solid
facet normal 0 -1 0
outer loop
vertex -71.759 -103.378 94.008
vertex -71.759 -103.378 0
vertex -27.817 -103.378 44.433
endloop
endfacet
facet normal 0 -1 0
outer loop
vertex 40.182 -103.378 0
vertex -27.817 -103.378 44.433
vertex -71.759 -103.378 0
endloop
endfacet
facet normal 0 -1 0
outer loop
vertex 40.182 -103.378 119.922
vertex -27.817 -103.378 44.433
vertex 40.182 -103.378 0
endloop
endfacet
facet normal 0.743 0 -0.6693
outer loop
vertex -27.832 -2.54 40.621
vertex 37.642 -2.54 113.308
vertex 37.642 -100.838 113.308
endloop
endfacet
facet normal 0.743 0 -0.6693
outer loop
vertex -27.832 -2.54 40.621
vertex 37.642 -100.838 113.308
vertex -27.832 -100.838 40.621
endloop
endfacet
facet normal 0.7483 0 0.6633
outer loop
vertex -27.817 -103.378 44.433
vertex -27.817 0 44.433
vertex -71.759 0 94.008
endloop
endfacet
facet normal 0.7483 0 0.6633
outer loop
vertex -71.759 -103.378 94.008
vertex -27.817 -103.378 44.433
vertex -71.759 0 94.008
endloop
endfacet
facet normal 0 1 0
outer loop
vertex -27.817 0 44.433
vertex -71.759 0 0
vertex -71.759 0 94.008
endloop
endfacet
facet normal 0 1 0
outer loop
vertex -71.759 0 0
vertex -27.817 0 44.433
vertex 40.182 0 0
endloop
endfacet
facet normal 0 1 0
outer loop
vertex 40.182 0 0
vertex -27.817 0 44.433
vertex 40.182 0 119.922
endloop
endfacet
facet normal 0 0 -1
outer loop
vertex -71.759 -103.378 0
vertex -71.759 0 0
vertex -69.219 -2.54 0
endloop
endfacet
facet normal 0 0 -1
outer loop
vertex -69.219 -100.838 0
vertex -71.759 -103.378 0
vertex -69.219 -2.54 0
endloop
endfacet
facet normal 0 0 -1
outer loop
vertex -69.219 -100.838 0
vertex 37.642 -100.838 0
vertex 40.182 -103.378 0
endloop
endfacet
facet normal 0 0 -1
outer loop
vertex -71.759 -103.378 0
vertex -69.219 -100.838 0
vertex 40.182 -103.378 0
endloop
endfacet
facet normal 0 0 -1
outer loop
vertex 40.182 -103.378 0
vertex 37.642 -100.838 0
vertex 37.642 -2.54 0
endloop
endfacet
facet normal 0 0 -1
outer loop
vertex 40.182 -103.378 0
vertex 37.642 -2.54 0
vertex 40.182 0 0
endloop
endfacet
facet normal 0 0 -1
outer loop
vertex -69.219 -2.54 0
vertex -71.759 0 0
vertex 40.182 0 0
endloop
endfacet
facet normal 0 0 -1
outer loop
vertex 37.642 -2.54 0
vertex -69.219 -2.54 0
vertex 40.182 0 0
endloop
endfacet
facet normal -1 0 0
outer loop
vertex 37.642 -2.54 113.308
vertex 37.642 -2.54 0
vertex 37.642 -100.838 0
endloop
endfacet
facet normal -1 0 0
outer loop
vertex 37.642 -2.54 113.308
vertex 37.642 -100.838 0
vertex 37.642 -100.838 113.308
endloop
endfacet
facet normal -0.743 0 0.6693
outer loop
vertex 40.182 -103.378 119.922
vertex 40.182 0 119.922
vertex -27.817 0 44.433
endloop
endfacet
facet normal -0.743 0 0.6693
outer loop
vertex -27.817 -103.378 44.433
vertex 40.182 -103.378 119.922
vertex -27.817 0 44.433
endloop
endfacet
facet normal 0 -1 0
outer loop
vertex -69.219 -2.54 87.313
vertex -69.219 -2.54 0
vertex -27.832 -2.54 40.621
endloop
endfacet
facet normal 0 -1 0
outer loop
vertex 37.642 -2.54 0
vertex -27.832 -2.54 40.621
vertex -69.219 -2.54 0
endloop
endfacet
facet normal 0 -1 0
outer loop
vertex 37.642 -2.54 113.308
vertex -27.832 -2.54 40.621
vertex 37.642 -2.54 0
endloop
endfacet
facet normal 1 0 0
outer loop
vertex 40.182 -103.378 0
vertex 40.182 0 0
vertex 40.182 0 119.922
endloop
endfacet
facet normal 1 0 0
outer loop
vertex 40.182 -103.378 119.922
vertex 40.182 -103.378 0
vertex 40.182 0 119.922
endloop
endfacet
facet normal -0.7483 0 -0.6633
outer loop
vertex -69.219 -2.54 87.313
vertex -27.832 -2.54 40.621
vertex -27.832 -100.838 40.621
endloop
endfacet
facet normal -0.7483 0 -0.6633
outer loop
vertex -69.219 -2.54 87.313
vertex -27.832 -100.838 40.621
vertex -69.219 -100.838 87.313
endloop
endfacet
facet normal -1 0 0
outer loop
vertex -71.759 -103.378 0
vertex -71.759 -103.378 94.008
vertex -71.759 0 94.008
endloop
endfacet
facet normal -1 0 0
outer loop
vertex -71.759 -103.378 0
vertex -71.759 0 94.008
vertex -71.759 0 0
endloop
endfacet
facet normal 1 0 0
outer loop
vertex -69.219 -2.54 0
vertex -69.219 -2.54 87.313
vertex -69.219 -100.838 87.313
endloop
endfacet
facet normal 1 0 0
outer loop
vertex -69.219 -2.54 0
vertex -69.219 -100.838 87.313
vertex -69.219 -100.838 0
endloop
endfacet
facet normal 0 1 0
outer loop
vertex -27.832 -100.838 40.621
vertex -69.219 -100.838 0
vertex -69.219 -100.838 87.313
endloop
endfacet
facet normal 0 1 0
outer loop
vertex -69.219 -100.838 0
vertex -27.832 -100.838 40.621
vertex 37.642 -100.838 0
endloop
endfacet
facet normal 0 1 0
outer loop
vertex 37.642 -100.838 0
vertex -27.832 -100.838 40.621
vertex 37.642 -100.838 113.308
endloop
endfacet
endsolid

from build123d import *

# Parameters (mm, degrees)
F1_DEPTH = 103.378
F2_T     = -2.54


with BuildPart() as f1:
    # F0 (on Front) → F1 (new body)
    with BuildSketch(Plane.XZ):
        Polygon((-71.7586703687, 0), (0, 0), (40.1820645289, 0), (40.1820645289, 119.9224553038), (-27.8168563806, 44.4326761603), (-71.7586703687, 94.0080558437), align=None)
    extrude(amount=F1_DEPTH)

    # F2
    f2_openings = [f1.faces().sort_by_distance(p)[0] for p in [
        (-15.788303, -51.689, 0),
    ]]
    offset(amount=F2_T, openings=f2_openings, kind=Kind.INTERSECTION)


solid = f1.part
